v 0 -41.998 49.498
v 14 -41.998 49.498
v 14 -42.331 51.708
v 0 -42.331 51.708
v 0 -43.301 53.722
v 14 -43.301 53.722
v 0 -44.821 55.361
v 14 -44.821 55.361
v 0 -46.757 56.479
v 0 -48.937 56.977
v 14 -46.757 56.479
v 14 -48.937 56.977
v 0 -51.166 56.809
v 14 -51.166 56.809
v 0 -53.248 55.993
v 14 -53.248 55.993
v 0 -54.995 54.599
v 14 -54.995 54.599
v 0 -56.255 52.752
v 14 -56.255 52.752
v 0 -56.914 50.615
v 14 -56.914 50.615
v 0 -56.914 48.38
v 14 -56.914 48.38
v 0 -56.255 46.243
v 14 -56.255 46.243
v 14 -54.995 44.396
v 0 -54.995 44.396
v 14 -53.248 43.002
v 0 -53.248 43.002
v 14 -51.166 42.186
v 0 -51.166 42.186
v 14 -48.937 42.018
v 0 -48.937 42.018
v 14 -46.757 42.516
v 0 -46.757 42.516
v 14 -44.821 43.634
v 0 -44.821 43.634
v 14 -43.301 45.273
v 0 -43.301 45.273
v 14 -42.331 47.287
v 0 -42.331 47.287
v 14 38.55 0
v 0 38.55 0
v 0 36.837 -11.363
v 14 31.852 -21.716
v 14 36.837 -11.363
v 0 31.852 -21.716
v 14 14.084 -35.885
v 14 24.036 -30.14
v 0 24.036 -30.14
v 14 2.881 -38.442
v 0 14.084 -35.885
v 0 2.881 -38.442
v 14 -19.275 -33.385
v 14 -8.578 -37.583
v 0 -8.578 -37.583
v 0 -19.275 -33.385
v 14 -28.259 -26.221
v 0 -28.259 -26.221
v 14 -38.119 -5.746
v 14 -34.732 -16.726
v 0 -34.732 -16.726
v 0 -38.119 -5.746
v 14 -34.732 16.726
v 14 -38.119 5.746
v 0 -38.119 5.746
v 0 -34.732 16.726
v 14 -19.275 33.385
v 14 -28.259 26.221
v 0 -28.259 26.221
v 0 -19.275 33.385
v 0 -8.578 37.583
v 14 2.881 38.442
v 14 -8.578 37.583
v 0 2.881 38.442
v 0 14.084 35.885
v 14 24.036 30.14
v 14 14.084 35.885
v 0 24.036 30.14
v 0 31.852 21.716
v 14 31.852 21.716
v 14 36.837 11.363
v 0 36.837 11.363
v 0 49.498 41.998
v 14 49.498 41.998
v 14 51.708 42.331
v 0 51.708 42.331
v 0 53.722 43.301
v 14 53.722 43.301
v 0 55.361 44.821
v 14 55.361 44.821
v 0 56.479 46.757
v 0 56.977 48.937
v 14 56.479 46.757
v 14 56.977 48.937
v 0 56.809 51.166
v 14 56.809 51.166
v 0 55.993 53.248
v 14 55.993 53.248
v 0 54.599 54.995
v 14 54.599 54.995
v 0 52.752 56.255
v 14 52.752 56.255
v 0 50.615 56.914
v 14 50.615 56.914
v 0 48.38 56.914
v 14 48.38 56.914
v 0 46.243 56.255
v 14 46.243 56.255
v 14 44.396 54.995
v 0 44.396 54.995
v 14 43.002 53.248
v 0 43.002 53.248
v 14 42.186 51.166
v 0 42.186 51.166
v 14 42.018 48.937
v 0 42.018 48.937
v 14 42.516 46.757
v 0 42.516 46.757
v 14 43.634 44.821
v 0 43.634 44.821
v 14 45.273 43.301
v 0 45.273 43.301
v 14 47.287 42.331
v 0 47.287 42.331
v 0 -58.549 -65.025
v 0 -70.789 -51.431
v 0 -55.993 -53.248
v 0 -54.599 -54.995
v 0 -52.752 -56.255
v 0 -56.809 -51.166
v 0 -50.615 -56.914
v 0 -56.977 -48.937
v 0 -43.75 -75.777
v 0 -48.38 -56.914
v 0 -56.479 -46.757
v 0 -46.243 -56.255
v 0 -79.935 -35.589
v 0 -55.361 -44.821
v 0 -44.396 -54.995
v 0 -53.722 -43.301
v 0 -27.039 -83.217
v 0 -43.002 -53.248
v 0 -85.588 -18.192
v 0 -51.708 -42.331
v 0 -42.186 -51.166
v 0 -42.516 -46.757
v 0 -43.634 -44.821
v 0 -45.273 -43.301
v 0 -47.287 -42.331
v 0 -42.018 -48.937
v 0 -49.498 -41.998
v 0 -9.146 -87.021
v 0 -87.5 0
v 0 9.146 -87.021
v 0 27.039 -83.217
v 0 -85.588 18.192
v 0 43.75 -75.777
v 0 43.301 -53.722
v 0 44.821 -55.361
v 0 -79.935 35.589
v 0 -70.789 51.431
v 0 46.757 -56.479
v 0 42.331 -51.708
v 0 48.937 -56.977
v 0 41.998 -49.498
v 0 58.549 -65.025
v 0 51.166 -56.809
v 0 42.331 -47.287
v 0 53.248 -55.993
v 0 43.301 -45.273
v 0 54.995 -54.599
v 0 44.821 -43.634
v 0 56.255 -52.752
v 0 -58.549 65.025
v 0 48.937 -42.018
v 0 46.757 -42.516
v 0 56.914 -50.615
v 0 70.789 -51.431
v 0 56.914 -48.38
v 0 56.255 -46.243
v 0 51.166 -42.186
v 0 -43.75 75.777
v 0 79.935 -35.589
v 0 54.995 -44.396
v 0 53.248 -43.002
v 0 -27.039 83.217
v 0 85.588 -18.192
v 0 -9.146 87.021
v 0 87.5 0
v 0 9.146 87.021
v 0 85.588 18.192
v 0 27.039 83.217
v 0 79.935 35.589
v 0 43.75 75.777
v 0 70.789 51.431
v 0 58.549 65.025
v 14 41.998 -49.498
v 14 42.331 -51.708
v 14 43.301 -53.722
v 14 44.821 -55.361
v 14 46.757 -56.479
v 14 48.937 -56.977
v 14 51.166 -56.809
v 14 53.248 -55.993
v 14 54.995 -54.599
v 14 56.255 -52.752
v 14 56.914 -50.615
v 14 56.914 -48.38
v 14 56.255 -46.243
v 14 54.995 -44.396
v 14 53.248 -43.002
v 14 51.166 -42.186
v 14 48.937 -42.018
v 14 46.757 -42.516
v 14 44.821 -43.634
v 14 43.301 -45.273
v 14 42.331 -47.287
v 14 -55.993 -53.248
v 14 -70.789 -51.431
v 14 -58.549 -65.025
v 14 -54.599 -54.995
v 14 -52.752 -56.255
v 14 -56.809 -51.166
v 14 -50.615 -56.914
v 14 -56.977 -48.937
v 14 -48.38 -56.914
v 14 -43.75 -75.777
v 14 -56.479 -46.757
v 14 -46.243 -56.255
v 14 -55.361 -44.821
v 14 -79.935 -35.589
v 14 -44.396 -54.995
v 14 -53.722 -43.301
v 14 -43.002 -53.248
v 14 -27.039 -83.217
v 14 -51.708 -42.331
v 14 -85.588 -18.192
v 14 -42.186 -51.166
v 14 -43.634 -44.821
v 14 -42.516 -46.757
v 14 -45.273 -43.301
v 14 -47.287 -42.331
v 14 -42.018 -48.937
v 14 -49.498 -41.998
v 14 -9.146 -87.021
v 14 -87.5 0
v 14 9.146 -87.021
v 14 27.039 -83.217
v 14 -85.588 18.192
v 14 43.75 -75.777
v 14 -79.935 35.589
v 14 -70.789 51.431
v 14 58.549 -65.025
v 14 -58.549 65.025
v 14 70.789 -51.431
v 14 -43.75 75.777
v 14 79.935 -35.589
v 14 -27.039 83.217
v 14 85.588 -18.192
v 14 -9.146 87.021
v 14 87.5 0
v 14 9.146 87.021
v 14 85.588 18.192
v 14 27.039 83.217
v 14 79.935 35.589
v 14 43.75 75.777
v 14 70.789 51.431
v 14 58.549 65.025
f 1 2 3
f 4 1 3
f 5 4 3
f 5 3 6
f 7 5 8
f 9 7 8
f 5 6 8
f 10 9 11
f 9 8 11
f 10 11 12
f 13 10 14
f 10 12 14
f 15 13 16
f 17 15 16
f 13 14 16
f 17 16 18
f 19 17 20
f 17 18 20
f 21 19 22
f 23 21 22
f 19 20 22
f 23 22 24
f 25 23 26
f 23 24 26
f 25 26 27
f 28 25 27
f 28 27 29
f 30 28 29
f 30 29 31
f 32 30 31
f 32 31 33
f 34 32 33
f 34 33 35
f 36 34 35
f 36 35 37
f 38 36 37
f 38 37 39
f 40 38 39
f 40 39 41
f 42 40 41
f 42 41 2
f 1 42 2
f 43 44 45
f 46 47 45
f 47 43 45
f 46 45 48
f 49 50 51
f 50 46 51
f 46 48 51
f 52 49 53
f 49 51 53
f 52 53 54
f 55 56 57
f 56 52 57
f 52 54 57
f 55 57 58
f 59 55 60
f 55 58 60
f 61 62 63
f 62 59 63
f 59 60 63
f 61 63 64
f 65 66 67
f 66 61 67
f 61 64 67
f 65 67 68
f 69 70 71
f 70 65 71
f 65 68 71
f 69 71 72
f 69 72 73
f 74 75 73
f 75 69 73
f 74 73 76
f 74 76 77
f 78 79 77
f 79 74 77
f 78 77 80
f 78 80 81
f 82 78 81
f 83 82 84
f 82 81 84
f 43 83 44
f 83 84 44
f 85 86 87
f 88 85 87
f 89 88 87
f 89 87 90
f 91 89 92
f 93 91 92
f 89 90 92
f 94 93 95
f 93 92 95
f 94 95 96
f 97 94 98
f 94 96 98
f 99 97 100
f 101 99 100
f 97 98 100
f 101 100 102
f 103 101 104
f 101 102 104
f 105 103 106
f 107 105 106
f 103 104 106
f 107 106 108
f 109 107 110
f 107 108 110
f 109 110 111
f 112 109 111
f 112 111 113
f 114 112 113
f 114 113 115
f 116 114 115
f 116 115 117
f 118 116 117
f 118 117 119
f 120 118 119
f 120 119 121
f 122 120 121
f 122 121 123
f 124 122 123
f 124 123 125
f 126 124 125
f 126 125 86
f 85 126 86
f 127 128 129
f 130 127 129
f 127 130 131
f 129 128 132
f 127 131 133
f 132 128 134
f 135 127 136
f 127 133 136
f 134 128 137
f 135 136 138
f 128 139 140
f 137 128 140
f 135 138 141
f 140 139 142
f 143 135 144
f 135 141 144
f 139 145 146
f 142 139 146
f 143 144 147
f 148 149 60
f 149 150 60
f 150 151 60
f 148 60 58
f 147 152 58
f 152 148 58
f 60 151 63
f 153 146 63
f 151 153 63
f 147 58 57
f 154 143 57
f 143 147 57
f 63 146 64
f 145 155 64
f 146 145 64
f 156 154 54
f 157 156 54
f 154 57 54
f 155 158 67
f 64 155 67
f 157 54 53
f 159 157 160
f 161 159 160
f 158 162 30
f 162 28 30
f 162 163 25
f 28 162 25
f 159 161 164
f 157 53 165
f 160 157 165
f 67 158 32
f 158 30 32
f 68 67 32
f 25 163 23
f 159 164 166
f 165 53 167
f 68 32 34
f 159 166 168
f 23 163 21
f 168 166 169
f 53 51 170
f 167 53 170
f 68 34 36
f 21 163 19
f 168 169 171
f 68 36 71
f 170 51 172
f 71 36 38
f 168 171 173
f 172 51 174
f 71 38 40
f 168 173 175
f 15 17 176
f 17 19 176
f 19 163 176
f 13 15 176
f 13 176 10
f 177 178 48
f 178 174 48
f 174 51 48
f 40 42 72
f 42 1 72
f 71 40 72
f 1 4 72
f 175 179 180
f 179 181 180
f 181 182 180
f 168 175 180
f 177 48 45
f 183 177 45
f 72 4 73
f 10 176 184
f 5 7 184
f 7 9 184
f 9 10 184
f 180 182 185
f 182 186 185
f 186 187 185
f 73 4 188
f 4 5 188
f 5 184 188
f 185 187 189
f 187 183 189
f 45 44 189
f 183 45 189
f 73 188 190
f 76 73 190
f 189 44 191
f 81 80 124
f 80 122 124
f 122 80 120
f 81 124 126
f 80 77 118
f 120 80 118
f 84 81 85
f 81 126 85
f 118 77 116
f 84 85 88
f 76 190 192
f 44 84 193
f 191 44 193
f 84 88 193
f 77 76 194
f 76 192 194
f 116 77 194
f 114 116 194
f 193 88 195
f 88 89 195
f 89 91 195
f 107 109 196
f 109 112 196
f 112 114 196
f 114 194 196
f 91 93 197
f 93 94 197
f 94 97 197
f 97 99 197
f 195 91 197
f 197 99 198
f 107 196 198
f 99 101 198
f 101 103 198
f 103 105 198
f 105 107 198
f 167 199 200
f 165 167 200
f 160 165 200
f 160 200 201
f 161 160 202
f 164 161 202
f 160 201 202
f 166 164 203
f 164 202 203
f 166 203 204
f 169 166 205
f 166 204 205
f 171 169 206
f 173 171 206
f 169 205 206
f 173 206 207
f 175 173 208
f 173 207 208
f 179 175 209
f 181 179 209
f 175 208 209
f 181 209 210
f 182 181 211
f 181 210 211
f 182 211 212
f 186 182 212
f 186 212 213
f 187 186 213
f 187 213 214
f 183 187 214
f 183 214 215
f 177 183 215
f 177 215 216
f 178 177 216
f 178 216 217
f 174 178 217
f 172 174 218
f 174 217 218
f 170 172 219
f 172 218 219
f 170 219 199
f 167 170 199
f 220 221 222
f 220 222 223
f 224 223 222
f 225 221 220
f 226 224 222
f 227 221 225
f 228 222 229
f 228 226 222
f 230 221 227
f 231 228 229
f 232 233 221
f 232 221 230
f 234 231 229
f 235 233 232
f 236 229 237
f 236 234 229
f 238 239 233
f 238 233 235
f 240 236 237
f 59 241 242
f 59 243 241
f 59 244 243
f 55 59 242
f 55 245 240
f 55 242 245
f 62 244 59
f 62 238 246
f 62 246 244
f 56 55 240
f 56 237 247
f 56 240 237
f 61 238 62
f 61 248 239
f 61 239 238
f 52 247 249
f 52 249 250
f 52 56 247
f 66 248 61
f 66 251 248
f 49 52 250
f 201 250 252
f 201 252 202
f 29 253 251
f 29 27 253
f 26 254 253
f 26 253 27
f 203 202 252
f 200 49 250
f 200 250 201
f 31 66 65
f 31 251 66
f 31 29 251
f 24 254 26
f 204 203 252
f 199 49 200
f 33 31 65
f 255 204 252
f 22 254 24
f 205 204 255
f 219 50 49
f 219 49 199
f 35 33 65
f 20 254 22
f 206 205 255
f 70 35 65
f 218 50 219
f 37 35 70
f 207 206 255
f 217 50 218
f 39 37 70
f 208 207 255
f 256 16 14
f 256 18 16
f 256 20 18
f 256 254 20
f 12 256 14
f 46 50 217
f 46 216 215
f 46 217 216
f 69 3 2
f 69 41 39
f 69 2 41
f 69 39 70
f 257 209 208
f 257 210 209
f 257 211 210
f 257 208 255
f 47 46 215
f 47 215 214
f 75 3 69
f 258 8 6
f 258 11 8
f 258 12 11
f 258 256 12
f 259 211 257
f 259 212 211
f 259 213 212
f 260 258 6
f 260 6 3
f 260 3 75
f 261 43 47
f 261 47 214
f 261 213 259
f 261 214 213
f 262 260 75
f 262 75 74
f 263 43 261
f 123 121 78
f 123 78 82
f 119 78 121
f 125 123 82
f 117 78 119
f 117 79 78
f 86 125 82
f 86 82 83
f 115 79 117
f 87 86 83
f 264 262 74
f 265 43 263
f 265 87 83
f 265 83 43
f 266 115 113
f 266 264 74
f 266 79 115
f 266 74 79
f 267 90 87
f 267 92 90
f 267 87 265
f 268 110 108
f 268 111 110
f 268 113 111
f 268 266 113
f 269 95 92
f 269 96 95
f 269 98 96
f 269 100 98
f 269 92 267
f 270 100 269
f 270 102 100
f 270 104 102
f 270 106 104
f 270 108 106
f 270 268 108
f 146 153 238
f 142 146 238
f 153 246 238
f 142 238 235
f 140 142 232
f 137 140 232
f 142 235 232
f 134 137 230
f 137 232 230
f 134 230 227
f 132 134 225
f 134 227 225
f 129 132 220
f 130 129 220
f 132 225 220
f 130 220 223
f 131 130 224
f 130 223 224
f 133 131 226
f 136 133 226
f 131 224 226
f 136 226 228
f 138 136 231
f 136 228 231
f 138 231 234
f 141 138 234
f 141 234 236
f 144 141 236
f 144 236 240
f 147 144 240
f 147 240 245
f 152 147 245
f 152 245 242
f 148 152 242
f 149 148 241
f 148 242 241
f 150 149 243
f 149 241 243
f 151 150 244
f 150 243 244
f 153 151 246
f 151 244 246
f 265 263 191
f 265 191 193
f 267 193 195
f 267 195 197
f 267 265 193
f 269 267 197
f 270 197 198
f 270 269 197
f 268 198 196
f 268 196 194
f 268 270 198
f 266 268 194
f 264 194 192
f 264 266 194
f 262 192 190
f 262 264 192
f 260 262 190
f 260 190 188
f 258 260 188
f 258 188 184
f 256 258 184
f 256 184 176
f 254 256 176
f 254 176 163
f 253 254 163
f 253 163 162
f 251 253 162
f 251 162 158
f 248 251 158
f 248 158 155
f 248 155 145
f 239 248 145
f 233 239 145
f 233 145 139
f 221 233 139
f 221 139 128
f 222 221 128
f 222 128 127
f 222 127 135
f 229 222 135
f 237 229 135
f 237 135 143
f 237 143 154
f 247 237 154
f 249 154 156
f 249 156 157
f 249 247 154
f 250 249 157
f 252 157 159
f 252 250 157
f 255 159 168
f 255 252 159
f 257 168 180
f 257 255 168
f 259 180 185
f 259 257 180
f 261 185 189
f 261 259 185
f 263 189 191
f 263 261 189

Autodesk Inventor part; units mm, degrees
ref_plane "YZ Plane" through (0, 0, 0) normal (1, 0, 0) x (0, 1, 0)
ref_plane "XZ Plane" through (0, 0, 0) normal (0, 1, 0) x (-1, 0, 0)
ref_plane "XY Plane" through (0, 0, 0) normal (0, 0, 1) x (1, 0, 0)
sketch "Sketch1" plane through (0, 0, 0) normal (0, 0, 1) x (1, 0, 0)
  line L0 (0, 0) -> (14, 0) construction
  line L1 (14, 0) -> (14, 38.55) construction
  line L2 (14, 38.55) -> (0, 38.55)
  line L3 (0, 38.55) -> (0, 0) construction
  line L4 (0, 38.55) -> (0, 87.5)
  line L5 (0, 87.5) -> (14, 87.5)
  line L6 (14, 87.5) -> (14, 38.55)
  dimension "d1" = 14
  dimension "d2" = 77.1
  dimension "d3" = 175
revolve "Revolution1" add sketch "Sketch1" angle 360 about axis through (0, 0, 0) along (1, 0, 0)
sketch "Sketch2" plane through (14, 0, 0) normal (1, 0, 0) x (0, 0, -1)
  circle A0 centre (0, 0) radius 87.5 projected
  circle A1 centre (-49.4975, 49.4975) radius 7.5
  circle A2 centre (0, 0) radius 70 construction
  line L0 (-49.4975, 49.4975) -> (0, 0) construction
  circle A3 centre (0, 0) radius 38.55 projected
  line L1 (0, 0) -> (-70, 0) construction
  dimension "d5" = 140
  dimension "d6" = 15
  dimension "d12" = 45
extrude "Extrusion1" cut sketch "Sketch2" against normal through all contours A1
pattern_circular "Circular Pattern1" count 4 over 360 about axis through (7, 0, 0) along (1, 0, 0) of "Extrusion1"
equation "\"d5\" = C1"
equation "\"d6\" = h1"
equation "\"d1\" = t"
equation "\"d2\" = d0"
equation "\"d3\" = D"
equation "\"d0\" = 77.1"
equation "\"D\" = 175"
equation "\"t\" = 14"
equation "\"C1\" = 140"
equation "\"h1\" = 15"
properties part number "JIS B 2220 Slip-On Welding Thin Plate Type Flange SOP - 10K 65" material "Steel"
